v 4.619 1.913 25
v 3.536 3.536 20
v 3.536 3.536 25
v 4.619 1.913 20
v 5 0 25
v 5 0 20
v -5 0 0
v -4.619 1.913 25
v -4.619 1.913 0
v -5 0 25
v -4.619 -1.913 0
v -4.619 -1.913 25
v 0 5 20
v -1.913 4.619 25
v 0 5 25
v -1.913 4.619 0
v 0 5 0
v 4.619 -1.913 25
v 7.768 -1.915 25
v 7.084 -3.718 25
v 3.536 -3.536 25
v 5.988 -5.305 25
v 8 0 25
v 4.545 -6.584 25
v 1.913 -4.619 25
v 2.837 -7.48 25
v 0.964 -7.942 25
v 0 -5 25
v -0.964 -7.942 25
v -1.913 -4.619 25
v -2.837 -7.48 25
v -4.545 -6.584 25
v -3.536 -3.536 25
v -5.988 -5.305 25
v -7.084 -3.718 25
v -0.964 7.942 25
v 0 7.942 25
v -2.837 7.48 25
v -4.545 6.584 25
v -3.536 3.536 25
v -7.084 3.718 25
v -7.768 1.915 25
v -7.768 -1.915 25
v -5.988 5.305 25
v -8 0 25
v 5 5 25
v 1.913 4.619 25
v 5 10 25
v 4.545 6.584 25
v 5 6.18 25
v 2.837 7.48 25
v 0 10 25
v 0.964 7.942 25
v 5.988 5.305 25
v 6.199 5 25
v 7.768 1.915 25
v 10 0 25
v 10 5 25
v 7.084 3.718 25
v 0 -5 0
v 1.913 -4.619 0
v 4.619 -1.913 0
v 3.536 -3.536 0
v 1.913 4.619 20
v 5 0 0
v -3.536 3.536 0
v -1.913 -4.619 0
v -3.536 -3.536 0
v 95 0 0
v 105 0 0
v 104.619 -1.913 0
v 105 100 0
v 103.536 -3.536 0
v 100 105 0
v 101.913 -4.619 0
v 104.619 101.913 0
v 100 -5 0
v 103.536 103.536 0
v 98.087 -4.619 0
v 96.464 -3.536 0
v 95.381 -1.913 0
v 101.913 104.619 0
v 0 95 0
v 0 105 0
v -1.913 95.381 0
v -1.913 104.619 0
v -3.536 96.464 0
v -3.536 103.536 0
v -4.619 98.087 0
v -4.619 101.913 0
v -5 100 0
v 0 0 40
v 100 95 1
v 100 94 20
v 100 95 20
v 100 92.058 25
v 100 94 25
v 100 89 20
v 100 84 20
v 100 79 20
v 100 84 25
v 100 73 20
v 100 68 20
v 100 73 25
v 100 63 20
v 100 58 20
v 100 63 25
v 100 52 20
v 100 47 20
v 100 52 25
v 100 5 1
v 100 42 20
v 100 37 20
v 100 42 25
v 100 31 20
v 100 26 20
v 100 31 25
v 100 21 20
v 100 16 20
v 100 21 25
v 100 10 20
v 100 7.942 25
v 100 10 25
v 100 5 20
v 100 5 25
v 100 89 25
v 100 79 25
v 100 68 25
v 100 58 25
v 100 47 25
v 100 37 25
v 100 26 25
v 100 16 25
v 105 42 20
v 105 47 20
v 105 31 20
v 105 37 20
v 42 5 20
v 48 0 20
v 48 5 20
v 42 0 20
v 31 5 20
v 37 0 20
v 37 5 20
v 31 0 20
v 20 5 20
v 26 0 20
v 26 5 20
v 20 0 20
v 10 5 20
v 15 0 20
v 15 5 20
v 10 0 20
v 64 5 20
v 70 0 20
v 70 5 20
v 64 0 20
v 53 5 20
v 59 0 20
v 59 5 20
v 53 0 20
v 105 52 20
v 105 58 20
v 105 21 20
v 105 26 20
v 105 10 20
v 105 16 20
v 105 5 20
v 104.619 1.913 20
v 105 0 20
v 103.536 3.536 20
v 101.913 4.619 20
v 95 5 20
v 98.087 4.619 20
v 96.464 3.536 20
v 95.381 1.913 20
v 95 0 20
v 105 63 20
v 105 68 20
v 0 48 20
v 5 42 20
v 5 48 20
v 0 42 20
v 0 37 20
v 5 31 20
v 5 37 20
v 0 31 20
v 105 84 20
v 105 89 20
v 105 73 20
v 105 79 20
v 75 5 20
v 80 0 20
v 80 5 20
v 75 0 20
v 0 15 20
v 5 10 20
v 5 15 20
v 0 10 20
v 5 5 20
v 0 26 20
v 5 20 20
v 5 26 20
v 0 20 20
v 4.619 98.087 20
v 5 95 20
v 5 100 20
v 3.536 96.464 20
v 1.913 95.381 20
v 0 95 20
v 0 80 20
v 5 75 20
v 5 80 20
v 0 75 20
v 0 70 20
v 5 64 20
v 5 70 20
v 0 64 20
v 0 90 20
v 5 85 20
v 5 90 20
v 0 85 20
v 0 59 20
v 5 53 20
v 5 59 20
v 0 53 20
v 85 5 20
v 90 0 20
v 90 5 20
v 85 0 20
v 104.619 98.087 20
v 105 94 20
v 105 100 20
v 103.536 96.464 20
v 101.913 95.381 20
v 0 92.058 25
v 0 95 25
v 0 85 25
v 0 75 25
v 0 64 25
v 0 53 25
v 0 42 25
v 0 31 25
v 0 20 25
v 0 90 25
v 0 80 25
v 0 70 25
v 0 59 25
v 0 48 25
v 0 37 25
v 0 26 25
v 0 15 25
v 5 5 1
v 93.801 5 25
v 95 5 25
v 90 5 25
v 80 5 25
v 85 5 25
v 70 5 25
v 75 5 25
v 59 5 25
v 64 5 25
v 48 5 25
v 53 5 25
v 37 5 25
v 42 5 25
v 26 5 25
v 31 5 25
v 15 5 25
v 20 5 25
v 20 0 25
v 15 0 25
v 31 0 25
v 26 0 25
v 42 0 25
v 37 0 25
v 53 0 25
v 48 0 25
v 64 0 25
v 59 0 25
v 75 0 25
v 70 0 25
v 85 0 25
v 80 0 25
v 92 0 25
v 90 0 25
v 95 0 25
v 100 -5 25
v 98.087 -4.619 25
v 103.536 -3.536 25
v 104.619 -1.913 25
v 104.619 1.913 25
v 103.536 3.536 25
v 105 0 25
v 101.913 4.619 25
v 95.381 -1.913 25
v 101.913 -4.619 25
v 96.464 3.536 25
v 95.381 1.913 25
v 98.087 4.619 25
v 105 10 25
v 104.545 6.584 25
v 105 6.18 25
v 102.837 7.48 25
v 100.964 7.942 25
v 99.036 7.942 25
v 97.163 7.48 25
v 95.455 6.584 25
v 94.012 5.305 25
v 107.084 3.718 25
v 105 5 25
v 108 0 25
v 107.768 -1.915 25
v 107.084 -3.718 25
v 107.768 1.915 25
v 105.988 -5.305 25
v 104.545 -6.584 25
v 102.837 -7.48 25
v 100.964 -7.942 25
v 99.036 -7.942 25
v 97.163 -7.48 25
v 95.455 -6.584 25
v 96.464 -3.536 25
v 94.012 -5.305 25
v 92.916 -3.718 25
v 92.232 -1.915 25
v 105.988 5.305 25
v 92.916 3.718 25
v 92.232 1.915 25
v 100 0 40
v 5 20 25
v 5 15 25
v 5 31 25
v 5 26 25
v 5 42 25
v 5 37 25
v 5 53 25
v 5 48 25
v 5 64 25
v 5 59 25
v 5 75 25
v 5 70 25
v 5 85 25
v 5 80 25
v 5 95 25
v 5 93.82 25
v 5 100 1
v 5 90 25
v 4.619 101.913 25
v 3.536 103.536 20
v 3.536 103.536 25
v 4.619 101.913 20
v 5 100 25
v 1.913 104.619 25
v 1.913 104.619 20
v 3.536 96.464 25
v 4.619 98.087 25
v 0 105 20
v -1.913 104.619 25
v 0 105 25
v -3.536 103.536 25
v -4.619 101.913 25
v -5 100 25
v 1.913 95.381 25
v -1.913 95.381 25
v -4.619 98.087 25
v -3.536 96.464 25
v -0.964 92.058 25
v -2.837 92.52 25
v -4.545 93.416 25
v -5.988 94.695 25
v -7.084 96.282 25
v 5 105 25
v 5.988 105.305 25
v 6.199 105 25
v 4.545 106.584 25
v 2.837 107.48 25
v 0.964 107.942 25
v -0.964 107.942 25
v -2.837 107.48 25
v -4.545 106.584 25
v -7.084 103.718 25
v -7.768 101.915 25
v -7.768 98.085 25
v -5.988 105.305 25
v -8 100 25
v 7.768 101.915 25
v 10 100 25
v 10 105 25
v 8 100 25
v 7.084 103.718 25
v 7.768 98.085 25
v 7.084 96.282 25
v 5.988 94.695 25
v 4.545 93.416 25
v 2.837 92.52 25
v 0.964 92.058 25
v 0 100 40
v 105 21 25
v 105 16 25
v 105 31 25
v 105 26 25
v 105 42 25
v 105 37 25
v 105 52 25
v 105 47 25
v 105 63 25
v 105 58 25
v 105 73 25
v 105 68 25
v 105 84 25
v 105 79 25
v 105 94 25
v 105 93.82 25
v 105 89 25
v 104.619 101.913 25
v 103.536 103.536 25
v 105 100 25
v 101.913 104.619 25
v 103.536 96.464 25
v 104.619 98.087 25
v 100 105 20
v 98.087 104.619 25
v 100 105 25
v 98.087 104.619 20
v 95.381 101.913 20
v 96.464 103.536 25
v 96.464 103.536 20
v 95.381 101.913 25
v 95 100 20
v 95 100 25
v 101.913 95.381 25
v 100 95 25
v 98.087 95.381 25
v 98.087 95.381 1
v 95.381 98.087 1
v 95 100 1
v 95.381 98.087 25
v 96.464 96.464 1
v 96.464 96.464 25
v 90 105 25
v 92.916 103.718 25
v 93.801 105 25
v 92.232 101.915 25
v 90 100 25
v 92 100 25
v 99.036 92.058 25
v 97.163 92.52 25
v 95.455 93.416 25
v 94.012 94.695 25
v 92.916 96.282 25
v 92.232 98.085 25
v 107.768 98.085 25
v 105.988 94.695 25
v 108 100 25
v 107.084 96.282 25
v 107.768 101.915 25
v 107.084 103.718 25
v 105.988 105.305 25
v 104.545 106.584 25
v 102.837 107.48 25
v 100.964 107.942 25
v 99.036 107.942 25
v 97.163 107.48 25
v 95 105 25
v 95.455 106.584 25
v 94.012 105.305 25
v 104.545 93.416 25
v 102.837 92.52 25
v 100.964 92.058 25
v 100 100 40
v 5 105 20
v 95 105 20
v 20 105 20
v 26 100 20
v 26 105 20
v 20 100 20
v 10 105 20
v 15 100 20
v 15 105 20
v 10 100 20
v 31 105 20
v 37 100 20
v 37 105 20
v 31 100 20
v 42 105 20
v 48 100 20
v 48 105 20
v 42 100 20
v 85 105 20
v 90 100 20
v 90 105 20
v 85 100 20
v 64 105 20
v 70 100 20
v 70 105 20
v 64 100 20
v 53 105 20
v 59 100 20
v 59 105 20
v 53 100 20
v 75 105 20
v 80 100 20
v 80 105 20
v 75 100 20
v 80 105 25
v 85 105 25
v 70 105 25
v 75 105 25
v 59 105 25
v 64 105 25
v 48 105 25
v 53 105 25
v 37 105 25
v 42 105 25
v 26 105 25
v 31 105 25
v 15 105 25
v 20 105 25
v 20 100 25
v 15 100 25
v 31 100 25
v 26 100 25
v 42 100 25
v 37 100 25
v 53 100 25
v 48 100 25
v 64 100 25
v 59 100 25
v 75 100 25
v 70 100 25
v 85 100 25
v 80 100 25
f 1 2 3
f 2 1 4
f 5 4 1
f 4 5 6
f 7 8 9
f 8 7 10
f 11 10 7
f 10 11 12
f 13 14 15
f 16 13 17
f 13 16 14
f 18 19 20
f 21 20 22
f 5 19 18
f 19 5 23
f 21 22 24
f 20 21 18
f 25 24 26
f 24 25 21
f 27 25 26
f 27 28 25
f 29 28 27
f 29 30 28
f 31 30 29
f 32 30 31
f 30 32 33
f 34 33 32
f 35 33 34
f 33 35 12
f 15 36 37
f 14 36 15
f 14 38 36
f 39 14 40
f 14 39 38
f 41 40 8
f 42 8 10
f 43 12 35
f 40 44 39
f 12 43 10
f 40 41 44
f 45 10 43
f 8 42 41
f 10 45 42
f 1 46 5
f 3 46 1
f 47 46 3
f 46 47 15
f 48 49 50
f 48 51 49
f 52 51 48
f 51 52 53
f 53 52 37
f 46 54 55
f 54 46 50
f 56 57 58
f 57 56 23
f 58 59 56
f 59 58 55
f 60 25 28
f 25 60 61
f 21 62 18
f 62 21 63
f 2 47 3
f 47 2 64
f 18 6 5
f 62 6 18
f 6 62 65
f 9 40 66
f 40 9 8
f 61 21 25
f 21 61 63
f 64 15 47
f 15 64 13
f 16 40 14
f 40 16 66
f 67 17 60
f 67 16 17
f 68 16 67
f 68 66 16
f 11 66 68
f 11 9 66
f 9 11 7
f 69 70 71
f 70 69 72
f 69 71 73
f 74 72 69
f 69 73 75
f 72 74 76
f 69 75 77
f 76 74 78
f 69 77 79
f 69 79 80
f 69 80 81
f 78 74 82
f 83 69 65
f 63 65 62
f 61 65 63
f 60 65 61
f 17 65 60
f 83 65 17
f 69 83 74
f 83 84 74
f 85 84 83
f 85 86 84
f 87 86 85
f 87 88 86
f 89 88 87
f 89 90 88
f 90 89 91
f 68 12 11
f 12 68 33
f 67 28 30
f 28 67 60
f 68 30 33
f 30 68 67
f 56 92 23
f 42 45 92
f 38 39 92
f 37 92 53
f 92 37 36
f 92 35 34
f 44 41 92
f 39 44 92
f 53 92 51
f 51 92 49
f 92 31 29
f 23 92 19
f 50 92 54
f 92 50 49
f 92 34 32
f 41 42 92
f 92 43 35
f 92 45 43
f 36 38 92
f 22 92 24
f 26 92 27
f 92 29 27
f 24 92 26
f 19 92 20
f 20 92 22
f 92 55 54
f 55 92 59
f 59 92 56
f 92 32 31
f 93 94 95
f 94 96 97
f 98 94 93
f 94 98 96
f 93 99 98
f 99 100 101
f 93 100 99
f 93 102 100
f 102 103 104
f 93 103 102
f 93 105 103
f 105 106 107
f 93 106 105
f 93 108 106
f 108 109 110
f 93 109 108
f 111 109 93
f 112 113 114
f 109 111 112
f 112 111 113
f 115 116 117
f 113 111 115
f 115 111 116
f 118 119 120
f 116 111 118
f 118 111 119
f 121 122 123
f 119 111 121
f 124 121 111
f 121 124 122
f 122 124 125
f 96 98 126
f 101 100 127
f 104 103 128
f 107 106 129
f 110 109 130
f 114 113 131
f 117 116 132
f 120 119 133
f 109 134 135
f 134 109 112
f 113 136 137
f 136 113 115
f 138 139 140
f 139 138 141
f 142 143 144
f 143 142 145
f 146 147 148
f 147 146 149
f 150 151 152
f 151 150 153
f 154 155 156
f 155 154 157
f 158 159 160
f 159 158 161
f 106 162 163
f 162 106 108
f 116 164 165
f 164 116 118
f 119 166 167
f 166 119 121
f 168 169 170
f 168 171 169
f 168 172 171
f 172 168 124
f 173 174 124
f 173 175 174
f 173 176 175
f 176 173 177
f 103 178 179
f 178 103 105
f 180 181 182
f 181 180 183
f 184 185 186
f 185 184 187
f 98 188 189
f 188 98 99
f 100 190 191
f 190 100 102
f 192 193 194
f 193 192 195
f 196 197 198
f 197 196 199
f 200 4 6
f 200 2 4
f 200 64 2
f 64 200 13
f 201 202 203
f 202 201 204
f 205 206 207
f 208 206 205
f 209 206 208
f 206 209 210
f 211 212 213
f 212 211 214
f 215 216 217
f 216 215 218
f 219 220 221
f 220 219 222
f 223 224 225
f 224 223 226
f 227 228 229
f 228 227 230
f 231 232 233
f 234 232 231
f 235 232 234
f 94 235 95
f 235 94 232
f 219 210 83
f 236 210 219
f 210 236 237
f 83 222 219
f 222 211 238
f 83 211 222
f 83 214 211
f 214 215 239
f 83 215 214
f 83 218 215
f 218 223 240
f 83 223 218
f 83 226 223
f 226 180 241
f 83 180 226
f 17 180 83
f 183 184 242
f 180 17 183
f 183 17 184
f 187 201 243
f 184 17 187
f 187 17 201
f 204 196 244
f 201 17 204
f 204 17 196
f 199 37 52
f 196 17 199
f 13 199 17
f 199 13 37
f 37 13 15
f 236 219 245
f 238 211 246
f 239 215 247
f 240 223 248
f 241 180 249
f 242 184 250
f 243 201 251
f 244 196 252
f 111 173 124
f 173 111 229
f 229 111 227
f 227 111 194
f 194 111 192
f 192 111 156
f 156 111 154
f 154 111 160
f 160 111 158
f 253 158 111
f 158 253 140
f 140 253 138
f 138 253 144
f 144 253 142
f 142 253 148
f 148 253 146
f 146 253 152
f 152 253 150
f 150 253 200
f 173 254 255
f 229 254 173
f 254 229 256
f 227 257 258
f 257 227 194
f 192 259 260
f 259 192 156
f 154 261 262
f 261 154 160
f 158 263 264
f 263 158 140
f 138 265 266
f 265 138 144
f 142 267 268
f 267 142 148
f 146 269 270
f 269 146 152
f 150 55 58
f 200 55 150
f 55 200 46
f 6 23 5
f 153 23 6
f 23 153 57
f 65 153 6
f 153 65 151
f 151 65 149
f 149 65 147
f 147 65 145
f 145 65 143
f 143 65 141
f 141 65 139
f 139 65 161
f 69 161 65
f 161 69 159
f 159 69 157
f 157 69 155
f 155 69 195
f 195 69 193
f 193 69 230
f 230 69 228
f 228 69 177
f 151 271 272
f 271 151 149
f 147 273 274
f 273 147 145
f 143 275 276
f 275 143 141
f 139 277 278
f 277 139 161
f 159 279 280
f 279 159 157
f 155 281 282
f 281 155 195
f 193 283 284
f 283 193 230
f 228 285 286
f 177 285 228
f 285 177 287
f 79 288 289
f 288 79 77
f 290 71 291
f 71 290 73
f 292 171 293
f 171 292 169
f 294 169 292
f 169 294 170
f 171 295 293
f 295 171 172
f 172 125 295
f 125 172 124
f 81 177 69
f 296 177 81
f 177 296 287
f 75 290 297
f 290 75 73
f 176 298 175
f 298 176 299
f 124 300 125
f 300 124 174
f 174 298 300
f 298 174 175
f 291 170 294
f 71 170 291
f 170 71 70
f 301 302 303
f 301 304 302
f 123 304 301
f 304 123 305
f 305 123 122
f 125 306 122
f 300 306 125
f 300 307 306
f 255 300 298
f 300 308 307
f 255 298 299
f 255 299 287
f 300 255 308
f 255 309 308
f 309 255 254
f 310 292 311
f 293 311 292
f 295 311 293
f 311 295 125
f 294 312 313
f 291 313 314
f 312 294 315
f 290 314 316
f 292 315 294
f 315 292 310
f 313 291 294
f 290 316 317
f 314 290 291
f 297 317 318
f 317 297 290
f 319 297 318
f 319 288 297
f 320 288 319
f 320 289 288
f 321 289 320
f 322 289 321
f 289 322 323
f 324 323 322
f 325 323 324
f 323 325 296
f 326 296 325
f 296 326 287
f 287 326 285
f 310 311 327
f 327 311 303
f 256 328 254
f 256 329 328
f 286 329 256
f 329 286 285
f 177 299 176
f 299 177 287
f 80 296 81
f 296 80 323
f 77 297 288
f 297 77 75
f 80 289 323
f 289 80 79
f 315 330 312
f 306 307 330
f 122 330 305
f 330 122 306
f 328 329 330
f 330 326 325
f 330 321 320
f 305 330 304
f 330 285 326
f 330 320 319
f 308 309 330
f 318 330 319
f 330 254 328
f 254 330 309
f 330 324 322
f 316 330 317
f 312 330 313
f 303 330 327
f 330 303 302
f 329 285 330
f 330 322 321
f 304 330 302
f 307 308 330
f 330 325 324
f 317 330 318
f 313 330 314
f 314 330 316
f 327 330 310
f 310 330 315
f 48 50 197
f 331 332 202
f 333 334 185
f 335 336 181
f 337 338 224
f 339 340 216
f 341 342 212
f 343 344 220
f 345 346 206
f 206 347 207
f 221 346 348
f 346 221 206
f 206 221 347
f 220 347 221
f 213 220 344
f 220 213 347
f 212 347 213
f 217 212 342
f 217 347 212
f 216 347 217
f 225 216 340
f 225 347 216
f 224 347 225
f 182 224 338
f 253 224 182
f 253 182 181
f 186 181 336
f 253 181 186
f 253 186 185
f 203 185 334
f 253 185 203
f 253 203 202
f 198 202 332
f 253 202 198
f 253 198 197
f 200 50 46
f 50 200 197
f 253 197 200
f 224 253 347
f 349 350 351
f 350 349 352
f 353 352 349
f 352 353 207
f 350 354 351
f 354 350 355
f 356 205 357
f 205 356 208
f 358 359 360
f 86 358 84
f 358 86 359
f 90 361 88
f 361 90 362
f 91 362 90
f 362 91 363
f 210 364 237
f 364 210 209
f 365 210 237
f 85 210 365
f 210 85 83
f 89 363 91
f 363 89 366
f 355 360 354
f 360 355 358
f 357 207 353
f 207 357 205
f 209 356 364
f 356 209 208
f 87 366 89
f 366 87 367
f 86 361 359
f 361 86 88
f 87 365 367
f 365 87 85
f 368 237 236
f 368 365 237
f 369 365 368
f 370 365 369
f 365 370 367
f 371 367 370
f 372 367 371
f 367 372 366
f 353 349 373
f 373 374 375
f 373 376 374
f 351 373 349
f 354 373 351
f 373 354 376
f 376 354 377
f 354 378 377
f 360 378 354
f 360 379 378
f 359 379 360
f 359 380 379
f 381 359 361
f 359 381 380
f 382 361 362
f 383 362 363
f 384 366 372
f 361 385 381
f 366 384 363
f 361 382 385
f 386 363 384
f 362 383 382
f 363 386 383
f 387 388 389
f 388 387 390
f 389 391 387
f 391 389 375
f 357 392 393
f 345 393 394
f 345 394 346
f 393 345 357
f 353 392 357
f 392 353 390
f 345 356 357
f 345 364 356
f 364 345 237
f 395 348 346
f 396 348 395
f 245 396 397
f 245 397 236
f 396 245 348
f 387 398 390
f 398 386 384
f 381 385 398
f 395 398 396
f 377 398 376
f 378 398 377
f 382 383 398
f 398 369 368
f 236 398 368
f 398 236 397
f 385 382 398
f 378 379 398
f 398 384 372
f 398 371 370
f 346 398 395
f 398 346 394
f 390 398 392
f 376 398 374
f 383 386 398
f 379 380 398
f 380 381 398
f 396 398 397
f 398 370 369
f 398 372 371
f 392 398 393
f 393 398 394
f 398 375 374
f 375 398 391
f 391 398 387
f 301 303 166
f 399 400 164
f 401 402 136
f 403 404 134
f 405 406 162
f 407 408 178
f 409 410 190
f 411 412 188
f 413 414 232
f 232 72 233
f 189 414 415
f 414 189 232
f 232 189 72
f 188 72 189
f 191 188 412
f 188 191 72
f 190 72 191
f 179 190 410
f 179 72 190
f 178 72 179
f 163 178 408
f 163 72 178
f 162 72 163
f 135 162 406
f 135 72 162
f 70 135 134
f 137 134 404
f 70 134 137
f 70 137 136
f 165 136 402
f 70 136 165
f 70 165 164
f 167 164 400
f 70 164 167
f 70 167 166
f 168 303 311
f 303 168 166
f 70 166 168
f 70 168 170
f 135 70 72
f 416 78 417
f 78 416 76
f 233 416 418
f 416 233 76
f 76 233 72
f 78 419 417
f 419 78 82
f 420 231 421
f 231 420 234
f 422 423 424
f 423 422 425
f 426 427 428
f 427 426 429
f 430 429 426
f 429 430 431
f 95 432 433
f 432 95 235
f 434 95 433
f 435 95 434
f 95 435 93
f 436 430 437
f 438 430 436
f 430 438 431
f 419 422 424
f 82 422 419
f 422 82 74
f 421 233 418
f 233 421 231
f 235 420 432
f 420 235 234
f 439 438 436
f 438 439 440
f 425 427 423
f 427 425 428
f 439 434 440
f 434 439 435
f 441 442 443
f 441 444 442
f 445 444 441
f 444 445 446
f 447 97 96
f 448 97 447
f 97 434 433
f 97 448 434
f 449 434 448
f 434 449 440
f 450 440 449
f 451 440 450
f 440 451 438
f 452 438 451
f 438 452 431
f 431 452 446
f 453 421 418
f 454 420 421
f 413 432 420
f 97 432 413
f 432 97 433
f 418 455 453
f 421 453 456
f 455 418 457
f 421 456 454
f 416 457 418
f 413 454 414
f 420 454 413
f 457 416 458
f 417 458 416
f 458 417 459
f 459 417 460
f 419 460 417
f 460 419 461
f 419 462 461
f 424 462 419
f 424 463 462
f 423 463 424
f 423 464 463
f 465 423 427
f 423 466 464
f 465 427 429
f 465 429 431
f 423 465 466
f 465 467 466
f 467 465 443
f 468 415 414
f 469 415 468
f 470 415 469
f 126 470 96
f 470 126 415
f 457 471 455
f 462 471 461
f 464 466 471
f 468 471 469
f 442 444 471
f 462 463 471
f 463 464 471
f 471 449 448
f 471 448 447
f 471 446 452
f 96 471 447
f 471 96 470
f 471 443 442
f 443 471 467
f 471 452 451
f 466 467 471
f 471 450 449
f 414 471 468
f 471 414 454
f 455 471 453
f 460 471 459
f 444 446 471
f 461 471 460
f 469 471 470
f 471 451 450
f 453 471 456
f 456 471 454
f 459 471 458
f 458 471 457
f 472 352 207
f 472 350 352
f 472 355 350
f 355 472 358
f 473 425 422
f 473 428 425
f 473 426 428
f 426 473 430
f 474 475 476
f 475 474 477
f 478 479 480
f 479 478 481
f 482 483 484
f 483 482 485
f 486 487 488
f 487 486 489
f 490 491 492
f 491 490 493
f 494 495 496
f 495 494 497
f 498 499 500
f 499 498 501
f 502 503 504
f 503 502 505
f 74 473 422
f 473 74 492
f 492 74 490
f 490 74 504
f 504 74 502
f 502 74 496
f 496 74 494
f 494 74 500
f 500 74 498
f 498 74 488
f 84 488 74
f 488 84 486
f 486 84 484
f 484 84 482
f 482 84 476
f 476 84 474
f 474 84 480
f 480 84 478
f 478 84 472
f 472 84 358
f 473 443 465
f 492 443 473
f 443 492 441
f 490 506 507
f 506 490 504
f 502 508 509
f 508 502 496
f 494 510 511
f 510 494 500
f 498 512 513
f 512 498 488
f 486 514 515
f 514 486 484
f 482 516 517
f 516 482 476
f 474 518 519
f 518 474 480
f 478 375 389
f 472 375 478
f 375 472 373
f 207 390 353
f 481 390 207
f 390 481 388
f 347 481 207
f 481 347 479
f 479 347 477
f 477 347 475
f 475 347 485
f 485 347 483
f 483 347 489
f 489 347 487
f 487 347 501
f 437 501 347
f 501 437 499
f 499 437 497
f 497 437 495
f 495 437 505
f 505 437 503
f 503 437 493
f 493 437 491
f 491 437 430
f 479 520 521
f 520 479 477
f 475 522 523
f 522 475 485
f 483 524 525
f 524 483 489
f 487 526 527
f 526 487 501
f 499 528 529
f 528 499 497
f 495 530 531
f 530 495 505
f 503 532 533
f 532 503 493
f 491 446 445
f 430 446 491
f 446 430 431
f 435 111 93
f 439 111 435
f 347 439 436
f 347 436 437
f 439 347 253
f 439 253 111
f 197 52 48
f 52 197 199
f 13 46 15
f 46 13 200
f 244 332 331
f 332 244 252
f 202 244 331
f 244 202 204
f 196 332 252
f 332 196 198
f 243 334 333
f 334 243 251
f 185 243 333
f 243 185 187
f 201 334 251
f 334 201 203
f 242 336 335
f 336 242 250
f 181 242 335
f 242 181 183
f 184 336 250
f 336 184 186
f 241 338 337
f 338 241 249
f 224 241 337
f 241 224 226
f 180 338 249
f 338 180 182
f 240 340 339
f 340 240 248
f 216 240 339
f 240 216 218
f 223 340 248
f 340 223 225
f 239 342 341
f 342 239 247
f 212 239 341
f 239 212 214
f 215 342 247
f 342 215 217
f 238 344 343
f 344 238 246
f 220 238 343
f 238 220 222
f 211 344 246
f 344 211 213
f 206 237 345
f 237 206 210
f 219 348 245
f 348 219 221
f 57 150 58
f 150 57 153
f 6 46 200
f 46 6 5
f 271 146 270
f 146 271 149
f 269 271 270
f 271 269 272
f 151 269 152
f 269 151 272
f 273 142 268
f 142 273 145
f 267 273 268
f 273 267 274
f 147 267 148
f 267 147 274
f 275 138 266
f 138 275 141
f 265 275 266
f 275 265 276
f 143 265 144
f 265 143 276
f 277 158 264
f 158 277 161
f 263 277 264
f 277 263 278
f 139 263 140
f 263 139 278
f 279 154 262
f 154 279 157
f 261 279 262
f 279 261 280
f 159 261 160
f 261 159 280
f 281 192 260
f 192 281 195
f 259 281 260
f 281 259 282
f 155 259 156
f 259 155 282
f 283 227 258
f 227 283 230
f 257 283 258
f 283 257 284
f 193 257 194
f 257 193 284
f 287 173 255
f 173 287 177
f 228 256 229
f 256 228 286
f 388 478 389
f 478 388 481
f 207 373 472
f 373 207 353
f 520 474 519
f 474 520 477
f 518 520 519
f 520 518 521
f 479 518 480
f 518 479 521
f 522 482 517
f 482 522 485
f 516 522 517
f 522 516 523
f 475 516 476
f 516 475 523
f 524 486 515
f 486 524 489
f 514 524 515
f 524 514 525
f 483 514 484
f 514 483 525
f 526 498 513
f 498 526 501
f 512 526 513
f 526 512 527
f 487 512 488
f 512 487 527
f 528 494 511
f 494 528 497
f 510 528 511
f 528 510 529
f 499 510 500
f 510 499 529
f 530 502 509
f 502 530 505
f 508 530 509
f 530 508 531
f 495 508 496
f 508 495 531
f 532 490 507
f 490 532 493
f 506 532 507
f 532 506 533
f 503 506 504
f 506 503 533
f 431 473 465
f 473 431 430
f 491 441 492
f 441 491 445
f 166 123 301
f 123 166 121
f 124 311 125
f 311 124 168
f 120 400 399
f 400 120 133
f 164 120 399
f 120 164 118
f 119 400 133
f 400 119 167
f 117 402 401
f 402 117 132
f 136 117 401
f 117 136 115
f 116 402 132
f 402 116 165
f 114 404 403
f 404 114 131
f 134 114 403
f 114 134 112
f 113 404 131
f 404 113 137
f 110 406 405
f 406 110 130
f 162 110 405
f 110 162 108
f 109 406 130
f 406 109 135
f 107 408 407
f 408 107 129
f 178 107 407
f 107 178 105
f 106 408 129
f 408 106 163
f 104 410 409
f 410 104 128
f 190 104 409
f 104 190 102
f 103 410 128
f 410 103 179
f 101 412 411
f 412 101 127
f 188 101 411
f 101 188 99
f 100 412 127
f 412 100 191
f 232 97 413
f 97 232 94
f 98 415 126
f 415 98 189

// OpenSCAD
/* FORMAS BÁSICAS: 
cube([3,7,8]);
circle(10);
sphere(10);
cylinder(h=15, r1=5, r2=2); 
cylinder(20, 9, center=true);
*/
 
 /* 
 //TRANLATE: 
translate([ 42,-42]) circle(20,$fn=100);
translate([-20, 0, 1]) sphere(10);
*/

/* RESOLUÇÃO: 
$fn=100;
*/

/* RESIZE: resize([x,y,z]) 
// resize the sphere to extend 30 in x, 60 in y, and 10 in the z directions.
resize(newsize=[30,60,10]) sphere(r=10); $fn=100;
*/


/* POLÍGONOS 2D
//polygon(points = [ [x, y], ... ], paths = [ [p1, p2, p3..], ...], convexity = N);
polygon(
    points = [[1,1], [1,3], [2,3], [3,4], [3,2], [4,2], [4,1]],
    paths = [[0,1,2,3,4,5,6]]);//ordem ds pares ordenados: indexes;
*/

/* POLIÉDRO - PIRÂMIDES (3D): 
polyhedron(
    points=[[0,0,0], [0,0,5], [5,0,5], [5,0,0], [3,10,3]],
    faces=[[0,1,2,3], [0,1,4], [1,2,4], [2,3,4], [0,3,4]]);
//faces: base, lateral 1, 2,3 e 4;
*/

/*DESAFIO: */
//circle(20);

/*MOVIMENTAÇÃO - TRANSLAÇÃO
translate([-40, -10, 10])
resize(newsize=[-9,0,0]) cube(18); */

/*MOVIMENTAÇÃO - ROTAÇÃO
rotate([45, 50, 60])
cube([10, 5, 8]); 

translate([30, 8, 10])
rotate([45, 0, 0])
cube([10, 5, 8]);

cube(10);
translate([40,0,0])
cube(10); */

/*ESCALA:
scale([0.5,2,2])
cylinder(20, 15, 0); */

/*VARIÁVEIS - APENAS TIPO NUMÉRICO: 
raio=3;
movimentoX=10;
translate([movimentoX-5, 0, 0])
sphere(raio+10); */

/*Forma textual
text("Cássia Santos");
translate(0, 0, -10)
text("Desenvolvedora Full-stack");*/

/*MODULO: 
module meu_modulo(){
    text("Cássia Santos", size=4);
};

meu_modulo();*/

/* ======================= Desafio: CASTELO =======================*/
//lateral 1:
cylinder(25, 5, 5);
translate([0,0,25])
cylinder(15, 8, 0);
cube([100, 5, 20]);

translate([100,0,0])
cylinder(25, 5, 5);

translate([100,0,25])
cylinder(15, 8, 0);

//lateral 2:
cube([5, 100, 20]);
translate([0,100,0])
cylinder(25, 5, 5);

translate([0,100,25])
cylinder(15, 8, 0);

//lateral 3:
translate([100,0,0])
cube([5, 100, 20]);
translate([100,100,0])
cylinder(25, 5, 5);

translate([100,100,25])
cylinder(15, 8, 0);

//lateral 4:
//rotate(180)
translate([0,100,0])
cube([100, 5, 20]);

//chão:
cube([100,100,1]);

//Cubos no muro:
module cuboMuro(){
    cube(5);
};

translate([0, 05, 20])
cuboMuro();

translate([0, 15, 20])
cuboMuro();

translate([0, 26, 20])
cuboMuro();

translate([0, 37, 20])
cuboMuro();

translate([0, 48, 20])
cuboMuro();

translate([0, 59, 20])
cuboMuro();

translate([0, 70, 20])
cuboMuro();

translate([0, 80, 20])
cuboMuro();

translate([0, 90, 20])
cuboMuro();

//outro lado dos quadrados no muro:
translate([05, 0, 20])
cuboMuro();
translate([15, 0, 20])
cuboMuro();
translate([26, 0, 20])
cuboMuro();
translate([37, 0, 20])
cuboMuro();
translate([37, 0, 20])
cuboMuro();
translate([48, 0, 20])
cuboMuro();
translate([59, 0, 20])
cuboMuro();
translate([70, 0, 20])
cuboMuro();
translate([80, 0, 20])
cuboMuro();
translate([90, 0, 20])
cuboMuro();

//outro lado dos quadrados no muro:
translate([5, 100, 20])
cuboMuro();
translate([15, 100, 20])
cuboMuro();
translate([26, 100, 20])
cuboMuro();
translate([37, 100, 20])
cuboMuro();
translate([37, 100, 20])
cuboMuro();
translate([48, 100, 20])
cuboMuro();
translate([59, 100, 20])
cuboMuro();
translate([70, 100, 20])
cuboMuro();
translate([80, 100, 20])
cuboMuro();
translate([90, 100, 20])
cuboMuro();

//outro lado dos quadrados no muro:
translate([100, 5, 20])
cuboMuro();
translate([100, 16, 20])
cuboMuro();
translate([100, 26, 20])
cuboMuro();
translate([100, 37, 20])
cuboMuro();
translate([100, 47, 20])
cuboMuro();
translate([100, 58, 20])
cuboMuro();
translate([100, 68, 20])
cuboMuro();
translate([100, 79, 20])
cuboMuro();
translate([100, 89, 20])
cuboMuro();
